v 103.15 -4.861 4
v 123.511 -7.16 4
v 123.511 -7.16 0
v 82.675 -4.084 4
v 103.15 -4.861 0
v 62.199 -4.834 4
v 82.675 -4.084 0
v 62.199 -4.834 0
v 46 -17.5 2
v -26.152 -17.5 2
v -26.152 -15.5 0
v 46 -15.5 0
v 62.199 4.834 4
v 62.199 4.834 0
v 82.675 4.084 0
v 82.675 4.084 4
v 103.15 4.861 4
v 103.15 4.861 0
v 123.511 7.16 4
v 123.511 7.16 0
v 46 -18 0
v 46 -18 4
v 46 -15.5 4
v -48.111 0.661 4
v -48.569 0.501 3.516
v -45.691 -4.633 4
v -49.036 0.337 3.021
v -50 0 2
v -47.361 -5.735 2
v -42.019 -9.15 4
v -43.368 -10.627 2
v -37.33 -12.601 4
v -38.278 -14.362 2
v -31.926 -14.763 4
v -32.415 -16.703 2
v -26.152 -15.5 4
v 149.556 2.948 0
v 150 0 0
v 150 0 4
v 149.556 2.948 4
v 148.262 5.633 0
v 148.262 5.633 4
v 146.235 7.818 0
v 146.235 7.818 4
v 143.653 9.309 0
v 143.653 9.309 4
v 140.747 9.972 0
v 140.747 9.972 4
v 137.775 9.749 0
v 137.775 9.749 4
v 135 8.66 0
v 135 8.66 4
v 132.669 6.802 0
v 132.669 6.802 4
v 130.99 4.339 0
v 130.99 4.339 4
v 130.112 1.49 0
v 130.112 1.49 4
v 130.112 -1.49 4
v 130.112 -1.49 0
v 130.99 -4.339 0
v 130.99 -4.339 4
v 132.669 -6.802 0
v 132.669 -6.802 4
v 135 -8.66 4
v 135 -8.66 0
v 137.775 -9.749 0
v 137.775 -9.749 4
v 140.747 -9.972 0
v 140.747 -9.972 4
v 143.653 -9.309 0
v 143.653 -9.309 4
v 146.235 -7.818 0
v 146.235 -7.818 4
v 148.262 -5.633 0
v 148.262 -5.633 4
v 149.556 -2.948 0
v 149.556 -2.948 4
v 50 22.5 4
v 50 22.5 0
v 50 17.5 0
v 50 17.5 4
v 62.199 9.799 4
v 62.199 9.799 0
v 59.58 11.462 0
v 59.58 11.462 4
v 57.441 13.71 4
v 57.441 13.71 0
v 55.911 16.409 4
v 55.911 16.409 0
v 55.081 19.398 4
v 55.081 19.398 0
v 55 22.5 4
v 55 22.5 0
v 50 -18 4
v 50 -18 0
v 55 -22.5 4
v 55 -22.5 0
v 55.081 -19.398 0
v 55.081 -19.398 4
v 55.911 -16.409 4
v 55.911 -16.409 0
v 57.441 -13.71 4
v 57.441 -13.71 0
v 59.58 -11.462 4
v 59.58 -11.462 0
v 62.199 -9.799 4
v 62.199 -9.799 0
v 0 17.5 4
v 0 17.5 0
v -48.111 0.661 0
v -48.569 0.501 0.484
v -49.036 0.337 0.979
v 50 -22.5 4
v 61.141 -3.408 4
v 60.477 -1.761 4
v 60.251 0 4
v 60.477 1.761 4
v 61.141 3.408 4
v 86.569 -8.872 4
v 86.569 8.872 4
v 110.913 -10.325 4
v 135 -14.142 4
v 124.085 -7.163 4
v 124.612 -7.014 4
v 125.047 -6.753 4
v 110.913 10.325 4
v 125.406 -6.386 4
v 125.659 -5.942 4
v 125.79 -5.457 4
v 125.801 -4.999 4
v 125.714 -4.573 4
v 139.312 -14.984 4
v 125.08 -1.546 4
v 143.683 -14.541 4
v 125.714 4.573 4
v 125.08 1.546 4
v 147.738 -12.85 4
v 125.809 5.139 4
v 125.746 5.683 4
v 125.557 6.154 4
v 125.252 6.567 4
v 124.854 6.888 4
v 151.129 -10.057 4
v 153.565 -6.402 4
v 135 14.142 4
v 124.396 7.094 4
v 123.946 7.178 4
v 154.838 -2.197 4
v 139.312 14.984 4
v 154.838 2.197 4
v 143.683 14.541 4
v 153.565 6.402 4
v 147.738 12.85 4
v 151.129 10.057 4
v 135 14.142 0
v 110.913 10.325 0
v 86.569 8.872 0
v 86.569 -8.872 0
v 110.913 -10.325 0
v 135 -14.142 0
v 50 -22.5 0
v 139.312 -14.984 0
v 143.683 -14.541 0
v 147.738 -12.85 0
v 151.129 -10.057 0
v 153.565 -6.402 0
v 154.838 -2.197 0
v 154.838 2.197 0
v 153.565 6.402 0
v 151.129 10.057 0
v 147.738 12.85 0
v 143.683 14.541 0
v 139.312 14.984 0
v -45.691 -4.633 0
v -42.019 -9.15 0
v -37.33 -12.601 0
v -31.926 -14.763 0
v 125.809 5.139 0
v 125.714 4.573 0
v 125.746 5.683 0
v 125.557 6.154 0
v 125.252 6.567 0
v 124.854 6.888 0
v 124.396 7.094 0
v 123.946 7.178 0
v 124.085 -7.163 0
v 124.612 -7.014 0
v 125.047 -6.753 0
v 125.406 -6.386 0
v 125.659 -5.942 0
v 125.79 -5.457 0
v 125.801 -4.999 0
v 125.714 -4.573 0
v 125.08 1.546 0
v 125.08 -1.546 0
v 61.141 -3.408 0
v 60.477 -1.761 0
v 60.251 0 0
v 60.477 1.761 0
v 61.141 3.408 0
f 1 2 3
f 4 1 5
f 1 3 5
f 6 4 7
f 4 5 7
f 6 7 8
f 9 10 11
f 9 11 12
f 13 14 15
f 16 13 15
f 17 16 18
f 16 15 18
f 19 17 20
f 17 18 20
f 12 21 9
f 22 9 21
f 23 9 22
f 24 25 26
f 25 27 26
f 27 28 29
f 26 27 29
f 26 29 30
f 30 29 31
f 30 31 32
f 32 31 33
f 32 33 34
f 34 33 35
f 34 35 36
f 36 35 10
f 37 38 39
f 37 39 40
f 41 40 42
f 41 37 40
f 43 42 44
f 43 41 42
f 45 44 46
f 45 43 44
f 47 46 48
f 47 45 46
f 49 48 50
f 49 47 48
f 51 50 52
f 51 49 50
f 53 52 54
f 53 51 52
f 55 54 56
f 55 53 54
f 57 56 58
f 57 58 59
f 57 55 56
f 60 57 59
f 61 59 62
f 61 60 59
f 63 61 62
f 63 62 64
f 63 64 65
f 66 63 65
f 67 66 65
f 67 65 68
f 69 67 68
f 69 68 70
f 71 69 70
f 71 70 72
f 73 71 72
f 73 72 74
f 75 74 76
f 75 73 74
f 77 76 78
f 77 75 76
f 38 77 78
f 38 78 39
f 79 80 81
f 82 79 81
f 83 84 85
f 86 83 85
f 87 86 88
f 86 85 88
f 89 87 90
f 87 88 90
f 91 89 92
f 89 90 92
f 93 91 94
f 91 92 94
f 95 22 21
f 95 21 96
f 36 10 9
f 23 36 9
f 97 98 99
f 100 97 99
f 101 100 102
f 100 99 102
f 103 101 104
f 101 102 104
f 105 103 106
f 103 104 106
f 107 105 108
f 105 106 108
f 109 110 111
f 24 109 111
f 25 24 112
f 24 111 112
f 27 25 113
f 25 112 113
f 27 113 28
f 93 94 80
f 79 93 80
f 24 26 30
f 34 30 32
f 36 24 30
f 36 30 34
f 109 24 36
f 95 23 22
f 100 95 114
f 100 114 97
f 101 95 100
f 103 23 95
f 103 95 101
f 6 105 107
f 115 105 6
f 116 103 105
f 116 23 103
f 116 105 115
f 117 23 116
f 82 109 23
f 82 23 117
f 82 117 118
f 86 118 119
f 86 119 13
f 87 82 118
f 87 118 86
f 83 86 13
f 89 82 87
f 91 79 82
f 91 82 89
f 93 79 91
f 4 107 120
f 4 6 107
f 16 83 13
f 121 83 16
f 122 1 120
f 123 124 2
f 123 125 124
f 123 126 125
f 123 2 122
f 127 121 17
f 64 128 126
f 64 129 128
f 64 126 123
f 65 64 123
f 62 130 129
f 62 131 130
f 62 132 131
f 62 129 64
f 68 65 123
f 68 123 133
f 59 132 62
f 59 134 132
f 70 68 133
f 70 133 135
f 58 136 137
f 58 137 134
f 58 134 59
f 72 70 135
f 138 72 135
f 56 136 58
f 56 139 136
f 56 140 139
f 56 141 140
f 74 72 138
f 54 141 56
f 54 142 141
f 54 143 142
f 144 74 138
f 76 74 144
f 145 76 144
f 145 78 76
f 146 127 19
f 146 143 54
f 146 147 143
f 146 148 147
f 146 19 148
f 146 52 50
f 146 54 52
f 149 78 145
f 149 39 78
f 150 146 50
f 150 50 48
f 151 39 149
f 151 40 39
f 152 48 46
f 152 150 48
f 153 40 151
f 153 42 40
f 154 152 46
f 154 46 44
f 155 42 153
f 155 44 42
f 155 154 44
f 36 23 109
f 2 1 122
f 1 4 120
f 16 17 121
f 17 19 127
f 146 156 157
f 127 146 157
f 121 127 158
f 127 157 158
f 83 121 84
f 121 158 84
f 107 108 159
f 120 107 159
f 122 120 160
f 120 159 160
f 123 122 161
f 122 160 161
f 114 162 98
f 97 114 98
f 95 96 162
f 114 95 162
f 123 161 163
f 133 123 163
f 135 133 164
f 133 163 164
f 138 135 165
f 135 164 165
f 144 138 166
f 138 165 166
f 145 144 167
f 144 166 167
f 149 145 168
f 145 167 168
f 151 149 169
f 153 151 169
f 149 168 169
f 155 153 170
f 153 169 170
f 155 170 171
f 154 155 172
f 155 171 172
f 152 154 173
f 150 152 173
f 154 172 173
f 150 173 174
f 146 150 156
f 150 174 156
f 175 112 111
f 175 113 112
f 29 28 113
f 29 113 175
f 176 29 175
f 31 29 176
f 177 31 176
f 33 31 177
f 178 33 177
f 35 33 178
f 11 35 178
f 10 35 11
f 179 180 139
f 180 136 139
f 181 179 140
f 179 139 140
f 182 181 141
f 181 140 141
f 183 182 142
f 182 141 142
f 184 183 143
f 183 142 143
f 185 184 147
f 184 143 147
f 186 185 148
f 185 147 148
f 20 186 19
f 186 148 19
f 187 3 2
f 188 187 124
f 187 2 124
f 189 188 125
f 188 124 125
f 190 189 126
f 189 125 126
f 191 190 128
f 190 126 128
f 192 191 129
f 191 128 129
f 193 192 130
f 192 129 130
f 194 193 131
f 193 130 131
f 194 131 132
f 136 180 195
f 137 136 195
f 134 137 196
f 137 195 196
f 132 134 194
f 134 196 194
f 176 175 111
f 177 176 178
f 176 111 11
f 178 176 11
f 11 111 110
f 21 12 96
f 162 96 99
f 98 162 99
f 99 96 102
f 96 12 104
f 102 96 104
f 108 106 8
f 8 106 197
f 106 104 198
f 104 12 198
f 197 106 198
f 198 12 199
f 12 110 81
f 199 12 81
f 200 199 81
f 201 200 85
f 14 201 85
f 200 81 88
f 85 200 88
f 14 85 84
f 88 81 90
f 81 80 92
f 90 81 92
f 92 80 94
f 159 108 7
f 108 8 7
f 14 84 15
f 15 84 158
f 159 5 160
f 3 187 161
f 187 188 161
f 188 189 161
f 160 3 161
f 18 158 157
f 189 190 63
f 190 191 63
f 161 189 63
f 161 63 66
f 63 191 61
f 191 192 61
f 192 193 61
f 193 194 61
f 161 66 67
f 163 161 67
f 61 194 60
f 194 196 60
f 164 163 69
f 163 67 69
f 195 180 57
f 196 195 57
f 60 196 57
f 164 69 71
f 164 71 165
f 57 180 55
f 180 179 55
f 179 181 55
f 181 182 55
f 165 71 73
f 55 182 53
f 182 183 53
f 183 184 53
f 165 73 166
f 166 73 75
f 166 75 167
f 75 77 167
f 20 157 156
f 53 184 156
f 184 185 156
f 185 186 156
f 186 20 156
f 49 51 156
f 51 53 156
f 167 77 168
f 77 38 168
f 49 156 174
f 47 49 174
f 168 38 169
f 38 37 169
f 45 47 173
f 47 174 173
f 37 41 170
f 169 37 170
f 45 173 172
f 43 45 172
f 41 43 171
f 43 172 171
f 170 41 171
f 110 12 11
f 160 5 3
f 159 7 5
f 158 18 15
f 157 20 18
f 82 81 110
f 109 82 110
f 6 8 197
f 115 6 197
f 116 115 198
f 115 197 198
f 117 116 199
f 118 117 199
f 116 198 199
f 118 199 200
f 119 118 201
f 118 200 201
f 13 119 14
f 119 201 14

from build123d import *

# Parameters (mm, degrees)
F0_R     = 10
F1_DEPTH = 4
F2_R     = 2
F3_W     = 4
F3_H     = 4
F4_DEPTH = 0.5
F5_SIZE  = 1.99999


# Not quite as in the source:
# - a fillet or chamfer is up to 0.001 mm smaller than in the source, because OpenCascade refuses the exact size


with BuildPart() as f1:
    # F0 (on Top) → F1 (new body)
    with BuildSketch(Plane.XY):
        with BuildLine():
            Line((50, 22.5), (50, 17.5))
            Line((50, 17.5), (0, 17.5))
            Line((0, 17.5), (-50, 0))
            ThreePointArc((-50, 0), (-40.9417194223, -12.6556443707), (-26.1515199646, -17.5))
            Line((-26.1515199646, -17.5), (50, -17.5))
            Line((50, -17.5), (50, -22.5))
            Line((50, -22.5), (55, -22.5))
            ThreePointArc((55, -22.5), (56.5936558821, -15.0125045804), (62.1990375221, -9.7988663689))
            ThreePointArc((62.1990375221, -9.7988663689), (98.7587484272, -9.3015269429), (135, -14.1421356237))
            ThreePointArc((135, -14.1421356237), (155, 0), (135, 14.1421356237))
            ThreePointArc((135, 14.1421356237), (98.7587484272, 9.3015269429), (62.1990375221, 9.7988663689))
            ThreePointArc((62.1990375221, 9.7988663689), (56.5936558821, 15.0125045804), (55, 22.5))
            Line((55, 22.5), (50, 22.5))
        make_face()
        with BuildLine():
            ThreePointArc((62.1990375221, -4.8343795659), (60.2509894701, 0), (62.1990375221, 4.8343795659))
            ThreePointArc((62.1990375221, 4.8343795659), (94.7590329876, 4.3577585856), (127.1470964452, 7.7332315503))
            ThreePointArc((127.1470964452, 7.7332315503), (125, 0), (127.1470964452, -7.7332315503))
            ThreePointArc((127.1470964452, -7.7332315503), (94.7590329876, -4.3577585856), (62.1990375221, -4.8343795659))
        make_face(mode=Mode.SUBTRACT)
        with Locations((140, 0)):
            Circle(F0_R, mode=Mode.SUBTRACT)
    extrude(amount=F1_DEPTH)

    # F2
    f2_edges = [f1.edges().sort_by_distance(p)[0] for p in [
        (127.147096, 7.733232, 2),
        (127.147096, -7.733232, 2),
    ]]
    fillet(f2_edges, radius=F2_R)

    # F3 (on face) → F4 (join)
    with BuildSketch(Plane.XZ.offset(17.5)):
        with Locations((48, 2)):
            Rectangle(F3_W, F3_H)
    extrude(amount=F4_DEPTH)

    # F5 (size 2 in the source; OpenCascade refuses exactly that, so slightly less here)
    f5_edges = [f1.edges().sort_by_distance(p)[0] for p in [
        (9.92424, -17.5, 4),
        (9.92424, -17.5, 0),
    ]]
    chamfer(f5_edges, length=F5_SIZE)


solid = f1.part
